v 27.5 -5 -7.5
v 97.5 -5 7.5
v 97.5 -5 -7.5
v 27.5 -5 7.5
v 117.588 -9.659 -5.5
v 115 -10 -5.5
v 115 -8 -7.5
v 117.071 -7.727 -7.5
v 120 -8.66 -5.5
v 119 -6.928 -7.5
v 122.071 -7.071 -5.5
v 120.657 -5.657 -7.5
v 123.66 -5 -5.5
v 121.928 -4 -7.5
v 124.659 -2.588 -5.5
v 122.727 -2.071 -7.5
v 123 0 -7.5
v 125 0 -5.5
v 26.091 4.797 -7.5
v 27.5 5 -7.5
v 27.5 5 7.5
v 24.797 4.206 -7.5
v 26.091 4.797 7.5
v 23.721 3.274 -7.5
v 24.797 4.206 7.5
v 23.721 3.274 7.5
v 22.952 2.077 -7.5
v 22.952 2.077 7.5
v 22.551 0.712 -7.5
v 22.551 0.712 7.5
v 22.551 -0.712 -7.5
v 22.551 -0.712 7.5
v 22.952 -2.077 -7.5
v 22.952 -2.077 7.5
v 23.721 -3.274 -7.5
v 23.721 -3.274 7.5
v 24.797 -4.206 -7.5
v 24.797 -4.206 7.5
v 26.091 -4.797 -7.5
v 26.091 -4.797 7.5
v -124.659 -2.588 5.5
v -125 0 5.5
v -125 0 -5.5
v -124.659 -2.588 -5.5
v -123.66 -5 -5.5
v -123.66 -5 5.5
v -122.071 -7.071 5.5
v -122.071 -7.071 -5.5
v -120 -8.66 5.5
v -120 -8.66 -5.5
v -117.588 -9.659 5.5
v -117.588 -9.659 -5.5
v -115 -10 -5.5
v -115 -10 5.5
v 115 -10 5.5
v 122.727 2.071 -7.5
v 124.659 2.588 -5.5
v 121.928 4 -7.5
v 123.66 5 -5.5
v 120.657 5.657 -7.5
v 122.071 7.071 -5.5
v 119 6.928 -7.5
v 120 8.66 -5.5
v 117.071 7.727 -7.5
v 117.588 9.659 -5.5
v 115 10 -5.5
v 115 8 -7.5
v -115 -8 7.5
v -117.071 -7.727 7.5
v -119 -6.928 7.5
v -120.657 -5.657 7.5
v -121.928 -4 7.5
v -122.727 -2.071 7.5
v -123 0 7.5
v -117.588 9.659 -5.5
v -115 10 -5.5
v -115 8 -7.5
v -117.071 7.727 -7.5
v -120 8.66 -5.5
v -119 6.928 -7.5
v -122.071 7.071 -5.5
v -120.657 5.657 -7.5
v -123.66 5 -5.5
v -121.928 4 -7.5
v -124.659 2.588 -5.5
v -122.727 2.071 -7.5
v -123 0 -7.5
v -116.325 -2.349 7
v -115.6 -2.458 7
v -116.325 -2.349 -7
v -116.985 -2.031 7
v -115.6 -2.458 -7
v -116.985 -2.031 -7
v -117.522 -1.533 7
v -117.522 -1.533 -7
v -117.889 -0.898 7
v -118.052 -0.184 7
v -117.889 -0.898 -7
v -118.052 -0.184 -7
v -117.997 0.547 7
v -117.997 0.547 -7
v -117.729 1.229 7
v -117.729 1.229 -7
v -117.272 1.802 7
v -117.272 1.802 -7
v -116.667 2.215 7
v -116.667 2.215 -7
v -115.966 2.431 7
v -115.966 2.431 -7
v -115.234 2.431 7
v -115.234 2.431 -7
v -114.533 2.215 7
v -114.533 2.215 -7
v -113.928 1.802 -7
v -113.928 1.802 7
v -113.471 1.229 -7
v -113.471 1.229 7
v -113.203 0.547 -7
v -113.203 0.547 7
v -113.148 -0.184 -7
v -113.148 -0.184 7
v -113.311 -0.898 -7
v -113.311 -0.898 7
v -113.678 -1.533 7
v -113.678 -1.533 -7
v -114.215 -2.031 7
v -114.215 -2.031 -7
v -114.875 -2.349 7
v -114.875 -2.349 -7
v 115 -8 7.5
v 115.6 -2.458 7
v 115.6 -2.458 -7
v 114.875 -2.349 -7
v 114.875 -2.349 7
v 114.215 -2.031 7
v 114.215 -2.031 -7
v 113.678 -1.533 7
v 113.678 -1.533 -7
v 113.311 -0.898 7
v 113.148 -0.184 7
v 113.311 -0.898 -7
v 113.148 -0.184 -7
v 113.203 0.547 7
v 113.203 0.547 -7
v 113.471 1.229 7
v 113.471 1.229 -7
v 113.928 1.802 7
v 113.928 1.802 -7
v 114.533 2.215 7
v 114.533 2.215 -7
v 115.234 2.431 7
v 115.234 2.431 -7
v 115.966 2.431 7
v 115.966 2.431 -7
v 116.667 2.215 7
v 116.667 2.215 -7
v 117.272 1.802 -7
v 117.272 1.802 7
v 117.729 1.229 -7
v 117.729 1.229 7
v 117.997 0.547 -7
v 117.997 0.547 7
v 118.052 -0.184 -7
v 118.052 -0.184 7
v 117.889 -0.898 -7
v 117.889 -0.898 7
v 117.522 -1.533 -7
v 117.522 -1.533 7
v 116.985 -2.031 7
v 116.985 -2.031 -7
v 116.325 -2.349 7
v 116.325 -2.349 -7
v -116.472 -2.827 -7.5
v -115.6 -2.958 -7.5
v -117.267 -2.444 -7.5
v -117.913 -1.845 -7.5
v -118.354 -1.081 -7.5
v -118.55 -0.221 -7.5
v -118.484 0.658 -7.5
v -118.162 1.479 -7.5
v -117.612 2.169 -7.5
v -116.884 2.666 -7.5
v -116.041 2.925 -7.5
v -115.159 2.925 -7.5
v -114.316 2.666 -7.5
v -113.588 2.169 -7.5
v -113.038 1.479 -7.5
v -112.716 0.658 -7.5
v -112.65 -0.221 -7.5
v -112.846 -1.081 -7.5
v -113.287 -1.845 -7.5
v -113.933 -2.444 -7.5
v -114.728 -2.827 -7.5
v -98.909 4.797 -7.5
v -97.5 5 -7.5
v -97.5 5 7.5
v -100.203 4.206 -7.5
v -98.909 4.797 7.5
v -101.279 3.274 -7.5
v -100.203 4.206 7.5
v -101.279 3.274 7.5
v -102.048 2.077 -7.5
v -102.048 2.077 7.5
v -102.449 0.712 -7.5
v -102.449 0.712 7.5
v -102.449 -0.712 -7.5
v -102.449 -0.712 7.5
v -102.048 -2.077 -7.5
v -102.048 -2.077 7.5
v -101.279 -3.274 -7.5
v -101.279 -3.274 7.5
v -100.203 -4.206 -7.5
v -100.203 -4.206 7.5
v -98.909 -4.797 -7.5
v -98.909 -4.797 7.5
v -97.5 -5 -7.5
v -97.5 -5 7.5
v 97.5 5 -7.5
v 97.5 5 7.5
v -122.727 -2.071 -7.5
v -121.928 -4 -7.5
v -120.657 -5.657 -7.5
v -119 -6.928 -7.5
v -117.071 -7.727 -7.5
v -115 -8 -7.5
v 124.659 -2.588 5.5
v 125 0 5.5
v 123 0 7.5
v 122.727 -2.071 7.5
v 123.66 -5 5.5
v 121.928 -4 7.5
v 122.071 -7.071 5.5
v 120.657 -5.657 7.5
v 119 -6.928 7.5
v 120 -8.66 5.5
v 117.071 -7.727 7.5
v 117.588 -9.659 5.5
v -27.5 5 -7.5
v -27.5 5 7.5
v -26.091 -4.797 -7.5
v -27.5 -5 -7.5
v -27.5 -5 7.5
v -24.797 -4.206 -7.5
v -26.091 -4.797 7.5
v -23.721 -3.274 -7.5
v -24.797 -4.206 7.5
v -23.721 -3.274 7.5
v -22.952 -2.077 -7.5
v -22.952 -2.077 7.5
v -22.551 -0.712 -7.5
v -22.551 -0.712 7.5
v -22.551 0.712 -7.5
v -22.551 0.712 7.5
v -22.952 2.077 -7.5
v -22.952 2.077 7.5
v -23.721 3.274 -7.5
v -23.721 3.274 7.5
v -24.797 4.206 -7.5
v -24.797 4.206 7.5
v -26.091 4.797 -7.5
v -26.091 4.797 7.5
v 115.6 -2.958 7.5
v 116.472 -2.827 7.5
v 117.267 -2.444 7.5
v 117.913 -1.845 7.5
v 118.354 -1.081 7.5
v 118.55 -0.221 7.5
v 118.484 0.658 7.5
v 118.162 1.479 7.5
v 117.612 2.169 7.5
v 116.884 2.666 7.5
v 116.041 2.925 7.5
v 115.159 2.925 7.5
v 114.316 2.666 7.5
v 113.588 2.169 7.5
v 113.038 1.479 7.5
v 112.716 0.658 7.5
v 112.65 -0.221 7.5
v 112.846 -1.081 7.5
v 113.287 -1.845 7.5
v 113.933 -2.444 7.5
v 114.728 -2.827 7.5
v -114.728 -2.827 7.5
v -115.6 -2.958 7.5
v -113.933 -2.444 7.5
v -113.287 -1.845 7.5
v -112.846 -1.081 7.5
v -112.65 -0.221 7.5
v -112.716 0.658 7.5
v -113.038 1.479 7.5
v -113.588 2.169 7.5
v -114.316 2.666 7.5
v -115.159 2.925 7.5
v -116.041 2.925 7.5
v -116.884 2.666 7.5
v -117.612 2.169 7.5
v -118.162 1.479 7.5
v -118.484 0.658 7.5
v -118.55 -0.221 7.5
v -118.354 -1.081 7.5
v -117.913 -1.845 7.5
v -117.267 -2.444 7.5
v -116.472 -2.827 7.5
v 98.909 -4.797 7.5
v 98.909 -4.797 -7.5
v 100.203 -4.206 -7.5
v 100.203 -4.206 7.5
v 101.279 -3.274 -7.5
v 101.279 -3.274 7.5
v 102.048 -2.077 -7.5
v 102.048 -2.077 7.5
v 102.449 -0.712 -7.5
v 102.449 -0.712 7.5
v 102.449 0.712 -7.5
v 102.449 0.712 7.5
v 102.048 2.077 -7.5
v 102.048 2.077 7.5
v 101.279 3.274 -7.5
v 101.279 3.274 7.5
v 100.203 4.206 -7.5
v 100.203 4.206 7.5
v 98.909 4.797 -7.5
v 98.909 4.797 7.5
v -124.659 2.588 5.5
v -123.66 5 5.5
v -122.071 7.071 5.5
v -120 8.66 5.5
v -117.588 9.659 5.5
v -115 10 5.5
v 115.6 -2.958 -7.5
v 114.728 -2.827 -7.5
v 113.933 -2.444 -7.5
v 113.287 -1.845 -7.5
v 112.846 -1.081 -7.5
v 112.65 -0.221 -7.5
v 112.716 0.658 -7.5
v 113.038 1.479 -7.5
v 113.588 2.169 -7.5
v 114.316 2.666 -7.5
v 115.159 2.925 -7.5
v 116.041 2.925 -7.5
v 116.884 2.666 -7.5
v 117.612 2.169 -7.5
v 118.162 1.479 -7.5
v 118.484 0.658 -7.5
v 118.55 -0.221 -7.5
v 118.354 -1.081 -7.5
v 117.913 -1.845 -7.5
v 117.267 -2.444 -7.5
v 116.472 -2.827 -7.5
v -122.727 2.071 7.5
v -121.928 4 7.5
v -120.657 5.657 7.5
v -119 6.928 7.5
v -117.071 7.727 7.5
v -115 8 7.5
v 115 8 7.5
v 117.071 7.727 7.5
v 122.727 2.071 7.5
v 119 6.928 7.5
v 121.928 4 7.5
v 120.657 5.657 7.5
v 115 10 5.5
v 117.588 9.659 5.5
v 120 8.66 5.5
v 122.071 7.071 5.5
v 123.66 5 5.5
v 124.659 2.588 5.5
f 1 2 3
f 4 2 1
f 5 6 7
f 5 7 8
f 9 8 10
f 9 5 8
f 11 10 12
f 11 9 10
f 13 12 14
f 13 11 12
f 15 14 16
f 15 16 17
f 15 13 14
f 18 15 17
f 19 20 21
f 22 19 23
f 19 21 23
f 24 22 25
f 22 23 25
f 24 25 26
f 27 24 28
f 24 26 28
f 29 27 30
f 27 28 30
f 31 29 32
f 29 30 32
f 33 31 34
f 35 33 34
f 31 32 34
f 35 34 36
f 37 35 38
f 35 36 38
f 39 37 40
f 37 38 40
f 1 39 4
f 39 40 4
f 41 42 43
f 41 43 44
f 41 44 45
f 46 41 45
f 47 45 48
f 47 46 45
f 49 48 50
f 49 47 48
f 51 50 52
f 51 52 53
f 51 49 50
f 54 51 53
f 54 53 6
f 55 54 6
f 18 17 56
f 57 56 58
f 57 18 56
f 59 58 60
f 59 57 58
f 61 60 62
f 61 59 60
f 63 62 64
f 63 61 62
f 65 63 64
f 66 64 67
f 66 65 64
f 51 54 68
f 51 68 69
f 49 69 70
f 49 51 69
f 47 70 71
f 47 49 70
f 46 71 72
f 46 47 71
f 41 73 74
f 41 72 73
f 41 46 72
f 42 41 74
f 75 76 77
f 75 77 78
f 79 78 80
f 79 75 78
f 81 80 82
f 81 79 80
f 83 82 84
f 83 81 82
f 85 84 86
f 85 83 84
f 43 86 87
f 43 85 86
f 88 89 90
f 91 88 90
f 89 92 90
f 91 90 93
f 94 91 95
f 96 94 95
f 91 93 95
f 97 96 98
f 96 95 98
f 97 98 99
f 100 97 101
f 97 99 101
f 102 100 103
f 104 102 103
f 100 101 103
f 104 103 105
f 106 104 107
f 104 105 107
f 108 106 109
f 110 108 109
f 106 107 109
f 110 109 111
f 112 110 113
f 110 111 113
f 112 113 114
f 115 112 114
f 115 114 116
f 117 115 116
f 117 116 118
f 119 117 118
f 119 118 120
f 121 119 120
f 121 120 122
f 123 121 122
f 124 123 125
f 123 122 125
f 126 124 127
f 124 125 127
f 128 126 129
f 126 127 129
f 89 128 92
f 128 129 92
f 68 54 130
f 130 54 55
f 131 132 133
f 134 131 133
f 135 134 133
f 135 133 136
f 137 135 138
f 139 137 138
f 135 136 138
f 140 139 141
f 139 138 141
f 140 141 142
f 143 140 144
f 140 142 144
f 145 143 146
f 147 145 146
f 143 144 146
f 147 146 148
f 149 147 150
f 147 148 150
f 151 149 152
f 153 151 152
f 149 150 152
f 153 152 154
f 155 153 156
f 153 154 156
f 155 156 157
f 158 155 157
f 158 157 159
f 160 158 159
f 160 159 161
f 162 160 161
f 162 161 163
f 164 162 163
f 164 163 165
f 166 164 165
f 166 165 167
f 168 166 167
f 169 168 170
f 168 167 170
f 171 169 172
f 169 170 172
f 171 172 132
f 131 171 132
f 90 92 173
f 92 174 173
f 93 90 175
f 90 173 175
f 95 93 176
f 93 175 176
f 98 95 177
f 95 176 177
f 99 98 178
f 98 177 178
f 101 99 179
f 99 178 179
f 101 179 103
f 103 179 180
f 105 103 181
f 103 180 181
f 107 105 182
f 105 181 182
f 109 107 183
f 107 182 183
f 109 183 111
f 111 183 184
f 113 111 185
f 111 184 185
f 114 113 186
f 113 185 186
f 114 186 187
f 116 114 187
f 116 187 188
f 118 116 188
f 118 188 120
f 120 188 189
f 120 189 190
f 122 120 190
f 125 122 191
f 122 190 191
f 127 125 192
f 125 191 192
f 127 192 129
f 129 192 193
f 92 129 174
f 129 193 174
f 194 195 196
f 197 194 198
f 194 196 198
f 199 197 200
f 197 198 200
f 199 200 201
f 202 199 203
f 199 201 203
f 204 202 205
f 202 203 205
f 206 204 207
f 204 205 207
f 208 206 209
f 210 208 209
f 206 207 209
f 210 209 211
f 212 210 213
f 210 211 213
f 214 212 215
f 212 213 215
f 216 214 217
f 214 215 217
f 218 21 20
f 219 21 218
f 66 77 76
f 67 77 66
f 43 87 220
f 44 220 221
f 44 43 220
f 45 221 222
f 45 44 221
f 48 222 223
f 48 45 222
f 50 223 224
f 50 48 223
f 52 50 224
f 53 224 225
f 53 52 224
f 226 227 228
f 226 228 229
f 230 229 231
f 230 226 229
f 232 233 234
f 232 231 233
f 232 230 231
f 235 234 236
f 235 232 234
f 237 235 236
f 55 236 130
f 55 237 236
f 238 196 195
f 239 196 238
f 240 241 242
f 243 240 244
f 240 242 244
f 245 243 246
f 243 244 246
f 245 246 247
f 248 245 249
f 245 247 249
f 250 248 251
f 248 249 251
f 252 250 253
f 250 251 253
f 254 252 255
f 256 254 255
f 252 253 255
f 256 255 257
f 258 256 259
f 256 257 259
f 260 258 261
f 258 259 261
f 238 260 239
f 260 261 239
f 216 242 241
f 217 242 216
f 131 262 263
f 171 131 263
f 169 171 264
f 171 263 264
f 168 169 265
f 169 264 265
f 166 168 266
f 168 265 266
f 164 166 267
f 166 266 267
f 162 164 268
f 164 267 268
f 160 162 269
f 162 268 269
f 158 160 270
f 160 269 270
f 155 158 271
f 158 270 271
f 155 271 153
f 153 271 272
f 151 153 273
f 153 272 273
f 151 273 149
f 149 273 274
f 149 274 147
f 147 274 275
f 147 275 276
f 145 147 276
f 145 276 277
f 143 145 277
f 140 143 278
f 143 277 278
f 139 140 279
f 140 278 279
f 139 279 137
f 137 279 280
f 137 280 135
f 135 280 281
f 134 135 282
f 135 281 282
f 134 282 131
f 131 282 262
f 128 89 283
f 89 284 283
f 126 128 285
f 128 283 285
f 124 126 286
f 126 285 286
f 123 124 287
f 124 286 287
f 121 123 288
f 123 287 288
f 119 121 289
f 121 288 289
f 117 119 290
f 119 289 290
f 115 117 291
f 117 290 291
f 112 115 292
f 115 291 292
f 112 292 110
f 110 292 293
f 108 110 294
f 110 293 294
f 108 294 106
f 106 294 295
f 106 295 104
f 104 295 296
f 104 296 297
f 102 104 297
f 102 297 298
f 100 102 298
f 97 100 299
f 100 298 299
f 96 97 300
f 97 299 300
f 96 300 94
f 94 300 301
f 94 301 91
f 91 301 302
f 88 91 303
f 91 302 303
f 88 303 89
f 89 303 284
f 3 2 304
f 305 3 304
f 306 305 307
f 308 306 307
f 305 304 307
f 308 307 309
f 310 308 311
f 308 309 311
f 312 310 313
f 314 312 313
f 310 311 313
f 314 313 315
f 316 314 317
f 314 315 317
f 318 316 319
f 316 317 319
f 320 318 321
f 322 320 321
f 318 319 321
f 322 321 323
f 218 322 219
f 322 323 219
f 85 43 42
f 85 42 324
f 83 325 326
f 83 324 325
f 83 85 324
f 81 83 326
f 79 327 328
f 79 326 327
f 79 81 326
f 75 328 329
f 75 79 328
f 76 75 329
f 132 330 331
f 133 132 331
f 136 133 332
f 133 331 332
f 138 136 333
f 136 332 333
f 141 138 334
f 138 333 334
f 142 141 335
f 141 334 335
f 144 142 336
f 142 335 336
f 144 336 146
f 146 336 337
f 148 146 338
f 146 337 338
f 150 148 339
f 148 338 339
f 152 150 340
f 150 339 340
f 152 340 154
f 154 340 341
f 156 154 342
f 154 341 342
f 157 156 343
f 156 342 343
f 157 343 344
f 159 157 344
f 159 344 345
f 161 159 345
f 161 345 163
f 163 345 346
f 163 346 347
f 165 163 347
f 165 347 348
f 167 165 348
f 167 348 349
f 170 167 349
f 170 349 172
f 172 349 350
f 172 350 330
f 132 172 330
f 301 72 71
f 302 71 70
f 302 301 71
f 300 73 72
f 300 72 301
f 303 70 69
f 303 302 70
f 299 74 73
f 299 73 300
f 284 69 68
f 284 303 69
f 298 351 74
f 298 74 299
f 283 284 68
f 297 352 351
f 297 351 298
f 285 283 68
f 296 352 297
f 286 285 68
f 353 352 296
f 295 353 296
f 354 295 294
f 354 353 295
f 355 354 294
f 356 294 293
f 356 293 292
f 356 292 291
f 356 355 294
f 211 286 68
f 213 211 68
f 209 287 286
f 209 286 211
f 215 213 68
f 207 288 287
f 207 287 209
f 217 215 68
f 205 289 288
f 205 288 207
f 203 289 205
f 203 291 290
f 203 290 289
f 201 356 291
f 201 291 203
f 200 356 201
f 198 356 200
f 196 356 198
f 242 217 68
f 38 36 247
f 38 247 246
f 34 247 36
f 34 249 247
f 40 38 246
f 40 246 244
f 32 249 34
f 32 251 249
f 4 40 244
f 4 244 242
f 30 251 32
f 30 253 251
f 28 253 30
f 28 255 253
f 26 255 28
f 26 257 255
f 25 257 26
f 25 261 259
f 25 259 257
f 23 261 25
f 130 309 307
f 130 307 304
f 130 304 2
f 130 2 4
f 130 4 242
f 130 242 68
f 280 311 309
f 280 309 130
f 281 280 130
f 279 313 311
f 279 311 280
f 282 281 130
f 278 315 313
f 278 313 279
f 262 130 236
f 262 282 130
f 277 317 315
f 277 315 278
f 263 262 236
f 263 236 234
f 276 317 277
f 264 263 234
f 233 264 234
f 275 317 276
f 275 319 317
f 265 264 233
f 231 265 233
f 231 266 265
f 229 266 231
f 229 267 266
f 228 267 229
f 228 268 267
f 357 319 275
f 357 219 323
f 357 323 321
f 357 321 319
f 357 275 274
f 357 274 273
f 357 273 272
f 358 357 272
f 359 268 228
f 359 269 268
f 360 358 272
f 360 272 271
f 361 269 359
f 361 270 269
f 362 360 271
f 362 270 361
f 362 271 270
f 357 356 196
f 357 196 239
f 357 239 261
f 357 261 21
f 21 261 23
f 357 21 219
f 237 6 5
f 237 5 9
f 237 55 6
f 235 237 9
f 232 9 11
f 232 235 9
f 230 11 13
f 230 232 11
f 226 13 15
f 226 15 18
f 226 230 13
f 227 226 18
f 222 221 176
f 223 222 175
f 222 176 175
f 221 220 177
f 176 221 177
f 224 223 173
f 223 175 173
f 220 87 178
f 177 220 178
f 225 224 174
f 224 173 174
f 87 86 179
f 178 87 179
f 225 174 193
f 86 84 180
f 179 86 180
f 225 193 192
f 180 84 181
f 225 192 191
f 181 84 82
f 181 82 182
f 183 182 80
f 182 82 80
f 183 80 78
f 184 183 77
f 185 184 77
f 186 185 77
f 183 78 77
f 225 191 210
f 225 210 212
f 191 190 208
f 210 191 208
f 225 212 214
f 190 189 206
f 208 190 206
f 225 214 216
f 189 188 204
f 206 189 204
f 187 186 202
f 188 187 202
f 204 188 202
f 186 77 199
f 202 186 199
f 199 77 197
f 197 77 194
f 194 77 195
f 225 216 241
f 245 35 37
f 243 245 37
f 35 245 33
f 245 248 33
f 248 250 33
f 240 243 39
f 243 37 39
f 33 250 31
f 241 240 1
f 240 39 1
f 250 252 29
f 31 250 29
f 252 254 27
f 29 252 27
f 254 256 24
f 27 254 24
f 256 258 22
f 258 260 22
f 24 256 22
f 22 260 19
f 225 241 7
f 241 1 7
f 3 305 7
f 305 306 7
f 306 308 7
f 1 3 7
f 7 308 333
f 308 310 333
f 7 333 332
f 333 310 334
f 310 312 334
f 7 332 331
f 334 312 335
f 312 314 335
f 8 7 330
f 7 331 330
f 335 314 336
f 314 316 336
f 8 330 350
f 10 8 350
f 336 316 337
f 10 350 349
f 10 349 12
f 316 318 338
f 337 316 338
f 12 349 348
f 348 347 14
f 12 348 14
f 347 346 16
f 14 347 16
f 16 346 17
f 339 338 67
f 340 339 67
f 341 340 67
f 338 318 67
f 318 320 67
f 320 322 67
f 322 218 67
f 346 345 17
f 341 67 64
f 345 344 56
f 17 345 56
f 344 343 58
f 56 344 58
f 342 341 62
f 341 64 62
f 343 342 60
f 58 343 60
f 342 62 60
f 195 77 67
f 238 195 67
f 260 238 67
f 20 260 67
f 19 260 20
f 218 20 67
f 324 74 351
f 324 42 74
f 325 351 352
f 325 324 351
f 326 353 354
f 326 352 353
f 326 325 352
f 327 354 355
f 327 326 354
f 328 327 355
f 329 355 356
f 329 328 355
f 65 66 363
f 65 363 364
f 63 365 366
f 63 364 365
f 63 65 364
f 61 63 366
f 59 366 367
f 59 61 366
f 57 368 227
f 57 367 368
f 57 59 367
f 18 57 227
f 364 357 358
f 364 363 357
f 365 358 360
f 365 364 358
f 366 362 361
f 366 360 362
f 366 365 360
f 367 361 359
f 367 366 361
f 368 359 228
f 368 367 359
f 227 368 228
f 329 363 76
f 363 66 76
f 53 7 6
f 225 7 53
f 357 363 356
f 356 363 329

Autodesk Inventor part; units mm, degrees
ref_plane "YZ Plane" through (0, 0, 0) normal (1, 0, 0) x (0, 1, 0)
ref_plane "XZ Plane" through (0, 0, 0) normal (0, 1, 0) x (-1, 0, 0)
ref_plane "XY Plane" through (0, 0, 0) normal (0, 0, 1) x (1, 0, 0)
sketch "Skizze1" plane through (0, 0, 0) normal (0, 0, 1) x (1, 0, 0)
  line L0 (-175, 0) -> (175, 0) construction
  line L1 (0, 14) -> (0, -14) construction
  line L2 (-125, -10) -> (125, -10)
  line L3 (125, -10) -> (125, 10)
  line L4 (125, 10) -> (-125, 10)
  line L5 (-125, 10) -> (-125, -10)
  line L6 (-125, -10) -> (125, 10) construction
  line L7 (125, -10) -> (-125, 10) construction
  point P0 (0, 0)
  dimension "d0" = 250
  dimension "d1" = 20
extrude "Grundkörper" add sketch "Skizze1" along normal mid plane 15
sketch "Skizze2" plane through (0, 0, 7.5) normal (0, 0, 1) x (1, 0, 0)
  line L0 (0, 14) -> (0, -14) construction
  point P0 (0, 0)
  point P1 (-115.6, 0)
  point P2 (115.6, 0)
  dimension "d4" = 231.2
hole "M6" at (-115.6, 0, 7.5) at (115.6, 0, 7.5) direction (0, 0, -1) diameter 4.917 end through all thread size "M6x1" class "6H" standard "ISO Metric profile"
sketch "Skizze3" plane through (0, 0, 7.5) normal (0, 0, 1) x (1, 0, 0)
  line L0 (0, 14) -> (0, -14) construction
  line L1 (-97.5, 5) -> (-27.5, 5)
  line L2 (-22.5, 0) -> (-22.5, 0)
  line L3 (-27.5, -5) -> (-97.5, -5)
  line L4 (-102.5, 0) -> (-102.5, 0)
  line L5 (-212.2426, 0) -> (181.2071, 0) construction
  line L6 (125, 10) -> (-125, 10) projected
  line L7 (0, 10) -> (-125, 10)
  line L8 (-62.5, 10) -> (-62.5, -10) construction
  line L9 (-125, -10) -> (125, -10) construction
  arc A0 (-102.5, 0) -> (-97.5, -5) centre (-97.5, 0) ccw
  arc A1 (-97.5, 5) -> (-102.5, 0) centre (-97.5, 0) ccw
  arc A2 (-22.5, 0) -> (-27.5, 5) centre (-27.5, 0) ccw
  arc A3 (-27.5, -5) -> (-22.5, 0) centre (-27.5, 0) ccw
  point P0 (0, 0)
  point P1 (-102.5, 5)
  point P2 (-22.5, 5)
  dimension "d16" = 10
  dimension "d17" = 80
  dimension "d18" = 5
extrude "Ausschnitt_Gewichtsreduktion" cut sketch "Skizze3" against normal through all
mirror "Spiegeln_Ausschnitt_Gewichtsreduktion" about plane through (0, 0, 0) normal (1, 0, 0) of "Ausschnitt_Gewichtsreduktion"
chamfer "Fase_M6_Gewinde" distance 0.5 angle 45 4 edges at (-115.6, 2.4585, -7.5) (-115.6, 2.4585, 7.5) (115.6, 2.4585, 7.5) (115.6, 2.4585, -7.5)
fillet "Abrundung" radius 10 4 edges at (-125, 10, 0) (-125, -10, 0) (125, -10, 0) (125, 10, 0)
chamfer "Fase2" distance 2 angle 45 8 edges at (0, -10, 7.5) (122.0711, -7.0711, 7.5) (0, 10, 7.5) (-122.0711, 7.0711, 7.5) (0, -10, -7.5) (-122.0711, 7.0711, -7.5) (0, 10, -7.5) (122.0711, -7.0711, -7.5)
properties part number "200-60-DIFFERENTIAL-BAR-03" material "Aluminium 6061"
